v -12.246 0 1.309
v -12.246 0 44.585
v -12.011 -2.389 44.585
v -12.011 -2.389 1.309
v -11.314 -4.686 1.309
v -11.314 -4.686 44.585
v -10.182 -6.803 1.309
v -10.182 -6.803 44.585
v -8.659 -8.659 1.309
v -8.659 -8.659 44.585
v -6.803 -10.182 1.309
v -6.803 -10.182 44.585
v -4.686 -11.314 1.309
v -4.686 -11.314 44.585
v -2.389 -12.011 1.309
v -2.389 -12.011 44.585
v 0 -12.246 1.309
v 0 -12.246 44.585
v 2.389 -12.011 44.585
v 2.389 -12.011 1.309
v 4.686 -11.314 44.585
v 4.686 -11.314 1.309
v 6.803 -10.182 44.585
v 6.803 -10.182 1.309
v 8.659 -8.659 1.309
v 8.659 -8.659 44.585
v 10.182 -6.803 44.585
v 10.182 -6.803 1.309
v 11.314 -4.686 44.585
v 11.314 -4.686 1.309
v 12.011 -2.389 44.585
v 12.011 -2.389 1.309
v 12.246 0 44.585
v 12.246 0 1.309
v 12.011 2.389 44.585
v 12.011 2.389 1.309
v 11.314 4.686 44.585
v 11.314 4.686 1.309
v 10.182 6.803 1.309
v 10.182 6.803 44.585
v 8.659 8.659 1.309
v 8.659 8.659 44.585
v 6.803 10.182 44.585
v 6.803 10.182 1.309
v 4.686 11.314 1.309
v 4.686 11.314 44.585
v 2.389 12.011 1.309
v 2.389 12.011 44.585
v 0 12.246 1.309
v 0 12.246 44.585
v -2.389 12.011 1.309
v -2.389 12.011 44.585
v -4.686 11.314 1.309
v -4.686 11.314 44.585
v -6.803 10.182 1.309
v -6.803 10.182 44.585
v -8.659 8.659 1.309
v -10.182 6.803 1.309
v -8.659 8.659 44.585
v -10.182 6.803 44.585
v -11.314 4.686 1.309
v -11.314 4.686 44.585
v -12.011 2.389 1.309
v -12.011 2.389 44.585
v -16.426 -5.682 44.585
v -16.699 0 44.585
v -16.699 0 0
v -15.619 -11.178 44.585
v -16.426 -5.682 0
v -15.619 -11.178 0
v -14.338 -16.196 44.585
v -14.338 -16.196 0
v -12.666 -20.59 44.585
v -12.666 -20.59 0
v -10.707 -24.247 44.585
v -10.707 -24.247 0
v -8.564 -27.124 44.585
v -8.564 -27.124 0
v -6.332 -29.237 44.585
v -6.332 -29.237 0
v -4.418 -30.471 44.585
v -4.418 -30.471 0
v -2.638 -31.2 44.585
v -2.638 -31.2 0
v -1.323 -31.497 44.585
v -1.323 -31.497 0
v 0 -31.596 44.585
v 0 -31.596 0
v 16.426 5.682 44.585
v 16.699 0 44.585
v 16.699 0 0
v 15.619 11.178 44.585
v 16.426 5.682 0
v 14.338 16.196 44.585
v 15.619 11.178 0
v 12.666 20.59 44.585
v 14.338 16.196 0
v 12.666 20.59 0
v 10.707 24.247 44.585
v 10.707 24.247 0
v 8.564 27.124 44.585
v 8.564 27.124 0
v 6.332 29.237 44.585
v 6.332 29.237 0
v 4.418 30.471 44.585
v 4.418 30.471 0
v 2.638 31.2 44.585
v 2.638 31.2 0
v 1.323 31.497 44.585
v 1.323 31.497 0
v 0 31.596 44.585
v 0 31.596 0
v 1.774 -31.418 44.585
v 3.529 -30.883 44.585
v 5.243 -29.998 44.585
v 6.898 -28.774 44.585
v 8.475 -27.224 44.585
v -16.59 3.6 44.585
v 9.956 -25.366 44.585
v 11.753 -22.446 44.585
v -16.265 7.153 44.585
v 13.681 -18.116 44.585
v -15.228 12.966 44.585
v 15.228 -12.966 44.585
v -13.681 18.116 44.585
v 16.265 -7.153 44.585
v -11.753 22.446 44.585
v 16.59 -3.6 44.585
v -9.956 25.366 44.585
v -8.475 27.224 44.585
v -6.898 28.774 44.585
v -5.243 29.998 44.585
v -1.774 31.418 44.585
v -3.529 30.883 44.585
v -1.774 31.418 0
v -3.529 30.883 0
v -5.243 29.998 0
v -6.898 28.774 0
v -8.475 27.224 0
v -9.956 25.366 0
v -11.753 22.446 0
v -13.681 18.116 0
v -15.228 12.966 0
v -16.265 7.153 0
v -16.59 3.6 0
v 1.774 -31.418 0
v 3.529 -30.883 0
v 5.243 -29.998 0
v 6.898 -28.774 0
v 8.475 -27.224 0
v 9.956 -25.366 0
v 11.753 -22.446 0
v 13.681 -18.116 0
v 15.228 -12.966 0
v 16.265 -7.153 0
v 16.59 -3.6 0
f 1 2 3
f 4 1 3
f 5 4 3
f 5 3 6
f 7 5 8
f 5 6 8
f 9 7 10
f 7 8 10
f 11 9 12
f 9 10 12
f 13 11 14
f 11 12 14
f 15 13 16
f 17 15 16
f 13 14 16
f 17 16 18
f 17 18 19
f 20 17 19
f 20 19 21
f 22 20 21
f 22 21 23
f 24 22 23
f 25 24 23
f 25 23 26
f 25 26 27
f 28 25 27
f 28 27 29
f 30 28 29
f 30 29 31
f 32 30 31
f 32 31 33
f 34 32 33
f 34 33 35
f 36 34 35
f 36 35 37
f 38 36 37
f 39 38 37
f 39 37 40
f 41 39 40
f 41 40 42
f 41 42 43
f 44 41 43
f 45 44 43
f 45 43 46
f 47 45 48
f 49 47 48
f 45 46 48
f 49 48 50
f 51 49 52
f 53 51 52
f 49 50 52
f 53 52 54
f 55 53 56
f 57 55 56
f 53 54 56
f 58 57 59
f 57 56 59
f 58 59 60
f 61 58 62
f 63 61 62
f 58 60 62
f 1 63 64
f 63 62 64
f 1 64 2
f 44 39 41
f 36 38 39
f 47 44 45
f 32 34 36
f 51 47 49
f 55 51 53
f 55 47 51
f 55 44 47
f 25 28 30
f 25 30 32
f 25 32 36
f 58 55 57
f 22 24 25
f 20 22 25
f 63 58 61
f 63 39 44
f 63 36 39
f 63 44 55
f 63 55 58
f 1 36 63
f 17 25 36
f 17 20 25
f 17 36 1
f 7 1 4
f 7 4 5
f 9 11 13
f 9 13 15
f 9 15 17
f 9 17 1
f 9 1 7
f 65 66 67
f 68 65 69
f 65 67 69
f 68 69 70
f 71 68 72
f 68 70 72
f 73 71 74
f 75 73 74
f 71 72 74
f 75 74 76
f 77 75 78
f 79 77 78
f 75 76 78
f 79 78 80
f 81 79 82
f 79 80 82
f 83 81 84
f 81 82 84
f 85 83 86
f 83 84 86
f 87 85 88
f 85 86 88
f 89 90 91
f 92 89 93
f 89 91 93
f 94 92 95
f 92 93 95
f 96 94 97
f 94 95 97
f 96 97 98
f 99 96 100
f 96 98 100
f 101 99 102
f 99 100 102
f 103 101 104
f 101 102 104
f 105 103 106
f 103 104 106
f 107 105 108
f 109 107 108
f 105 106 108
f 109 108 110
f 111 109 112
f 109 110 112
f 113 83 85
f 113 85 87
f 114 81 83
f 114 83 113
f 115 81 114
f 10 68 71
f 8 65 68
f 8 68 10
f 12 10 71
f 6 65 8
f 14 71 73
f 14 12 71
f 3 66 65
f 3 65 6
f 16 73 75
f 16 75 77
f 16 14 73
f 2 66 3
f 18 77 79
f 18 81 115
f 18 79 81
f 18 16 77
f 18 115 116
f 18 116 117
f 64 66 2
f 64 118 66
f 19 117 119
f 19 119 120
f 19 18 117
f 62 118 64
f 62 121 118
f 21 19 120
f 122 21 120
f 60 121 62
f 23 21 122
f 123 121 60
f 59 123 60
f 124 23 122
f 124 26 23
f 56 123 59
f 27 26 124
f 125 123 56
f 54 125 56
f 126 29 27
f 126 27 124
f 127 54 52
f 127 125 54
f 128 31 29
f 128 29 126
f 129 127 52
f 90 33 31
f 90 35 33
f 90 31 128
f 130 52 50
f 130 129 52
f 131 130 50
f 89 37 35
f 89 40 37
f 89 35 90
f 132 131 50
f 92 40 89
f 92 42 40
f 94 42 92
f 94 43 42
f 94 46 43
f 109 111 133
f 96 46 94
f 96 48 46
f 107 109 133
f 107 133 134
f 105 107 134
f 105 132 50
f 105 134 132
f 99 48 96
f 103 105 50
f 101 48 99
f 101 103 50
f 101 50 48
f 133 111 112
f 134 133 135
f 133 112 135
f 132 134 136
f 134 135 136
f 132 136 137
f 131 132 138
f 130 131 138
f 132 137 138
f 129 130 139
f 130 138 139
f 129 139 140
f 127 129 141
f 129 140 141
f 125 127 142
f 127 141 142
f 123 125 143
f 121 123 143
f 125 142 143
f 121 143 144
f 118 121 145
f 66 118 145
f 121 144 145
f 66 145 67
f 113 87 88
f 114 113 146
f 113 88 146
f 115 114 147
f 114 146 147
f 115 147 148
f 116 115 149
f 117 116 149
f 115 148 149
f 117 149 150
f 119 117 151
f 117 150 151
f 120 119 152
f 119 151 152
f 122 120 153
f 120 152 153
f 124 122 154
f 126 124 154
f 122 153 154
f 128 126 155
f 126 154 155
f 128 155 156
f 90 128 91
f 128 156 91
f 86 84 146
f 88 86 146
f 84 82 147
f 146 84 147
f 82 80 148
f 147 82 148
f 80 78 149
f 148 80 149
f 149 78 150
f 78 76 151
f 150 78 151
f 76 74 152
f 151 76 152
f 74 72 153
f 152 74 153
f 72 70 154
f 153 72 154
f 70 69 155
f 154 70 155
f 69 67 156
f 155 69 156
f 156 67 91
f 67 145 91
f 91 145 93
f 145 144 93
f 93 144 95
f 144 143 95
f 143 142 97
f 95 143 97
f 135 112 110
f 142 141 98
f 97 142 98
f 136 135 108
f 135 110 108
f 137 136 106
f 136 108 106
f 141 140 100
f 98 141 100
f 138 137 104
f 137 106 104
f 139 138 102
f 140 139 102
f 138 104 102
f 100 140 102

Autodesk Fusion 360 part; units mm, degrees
sketch "Sketch1" plane through (0, 0, 0) normal (0, 0, 1) x (1, 0, 0)
  ellipse E0 centre (0, 0) end of major axis (0, 31.5965) minor radius 16.6986
  line L0 (0, -31.5965) -> (0, 31.5965)
  line L1 (16.6986, 0) -> (-16.6986, 0)
extrude "Extrude1" add sketch "Sketch1" along normal blind 44.585
ref_plane "WorkPlane1" through (0, 0, 13.758) normal (0, 0, 1) x (1, 0, 0)
sketch "Sketch9" plane through (0, 0, 44.585) normal (0, 0, 1) x (-1, 0, 0)
  circle A0 centre (0, 0) radius 12.2459
extrude "Extrude3" cut sketch "Sketch9" against normal blind 43.276
